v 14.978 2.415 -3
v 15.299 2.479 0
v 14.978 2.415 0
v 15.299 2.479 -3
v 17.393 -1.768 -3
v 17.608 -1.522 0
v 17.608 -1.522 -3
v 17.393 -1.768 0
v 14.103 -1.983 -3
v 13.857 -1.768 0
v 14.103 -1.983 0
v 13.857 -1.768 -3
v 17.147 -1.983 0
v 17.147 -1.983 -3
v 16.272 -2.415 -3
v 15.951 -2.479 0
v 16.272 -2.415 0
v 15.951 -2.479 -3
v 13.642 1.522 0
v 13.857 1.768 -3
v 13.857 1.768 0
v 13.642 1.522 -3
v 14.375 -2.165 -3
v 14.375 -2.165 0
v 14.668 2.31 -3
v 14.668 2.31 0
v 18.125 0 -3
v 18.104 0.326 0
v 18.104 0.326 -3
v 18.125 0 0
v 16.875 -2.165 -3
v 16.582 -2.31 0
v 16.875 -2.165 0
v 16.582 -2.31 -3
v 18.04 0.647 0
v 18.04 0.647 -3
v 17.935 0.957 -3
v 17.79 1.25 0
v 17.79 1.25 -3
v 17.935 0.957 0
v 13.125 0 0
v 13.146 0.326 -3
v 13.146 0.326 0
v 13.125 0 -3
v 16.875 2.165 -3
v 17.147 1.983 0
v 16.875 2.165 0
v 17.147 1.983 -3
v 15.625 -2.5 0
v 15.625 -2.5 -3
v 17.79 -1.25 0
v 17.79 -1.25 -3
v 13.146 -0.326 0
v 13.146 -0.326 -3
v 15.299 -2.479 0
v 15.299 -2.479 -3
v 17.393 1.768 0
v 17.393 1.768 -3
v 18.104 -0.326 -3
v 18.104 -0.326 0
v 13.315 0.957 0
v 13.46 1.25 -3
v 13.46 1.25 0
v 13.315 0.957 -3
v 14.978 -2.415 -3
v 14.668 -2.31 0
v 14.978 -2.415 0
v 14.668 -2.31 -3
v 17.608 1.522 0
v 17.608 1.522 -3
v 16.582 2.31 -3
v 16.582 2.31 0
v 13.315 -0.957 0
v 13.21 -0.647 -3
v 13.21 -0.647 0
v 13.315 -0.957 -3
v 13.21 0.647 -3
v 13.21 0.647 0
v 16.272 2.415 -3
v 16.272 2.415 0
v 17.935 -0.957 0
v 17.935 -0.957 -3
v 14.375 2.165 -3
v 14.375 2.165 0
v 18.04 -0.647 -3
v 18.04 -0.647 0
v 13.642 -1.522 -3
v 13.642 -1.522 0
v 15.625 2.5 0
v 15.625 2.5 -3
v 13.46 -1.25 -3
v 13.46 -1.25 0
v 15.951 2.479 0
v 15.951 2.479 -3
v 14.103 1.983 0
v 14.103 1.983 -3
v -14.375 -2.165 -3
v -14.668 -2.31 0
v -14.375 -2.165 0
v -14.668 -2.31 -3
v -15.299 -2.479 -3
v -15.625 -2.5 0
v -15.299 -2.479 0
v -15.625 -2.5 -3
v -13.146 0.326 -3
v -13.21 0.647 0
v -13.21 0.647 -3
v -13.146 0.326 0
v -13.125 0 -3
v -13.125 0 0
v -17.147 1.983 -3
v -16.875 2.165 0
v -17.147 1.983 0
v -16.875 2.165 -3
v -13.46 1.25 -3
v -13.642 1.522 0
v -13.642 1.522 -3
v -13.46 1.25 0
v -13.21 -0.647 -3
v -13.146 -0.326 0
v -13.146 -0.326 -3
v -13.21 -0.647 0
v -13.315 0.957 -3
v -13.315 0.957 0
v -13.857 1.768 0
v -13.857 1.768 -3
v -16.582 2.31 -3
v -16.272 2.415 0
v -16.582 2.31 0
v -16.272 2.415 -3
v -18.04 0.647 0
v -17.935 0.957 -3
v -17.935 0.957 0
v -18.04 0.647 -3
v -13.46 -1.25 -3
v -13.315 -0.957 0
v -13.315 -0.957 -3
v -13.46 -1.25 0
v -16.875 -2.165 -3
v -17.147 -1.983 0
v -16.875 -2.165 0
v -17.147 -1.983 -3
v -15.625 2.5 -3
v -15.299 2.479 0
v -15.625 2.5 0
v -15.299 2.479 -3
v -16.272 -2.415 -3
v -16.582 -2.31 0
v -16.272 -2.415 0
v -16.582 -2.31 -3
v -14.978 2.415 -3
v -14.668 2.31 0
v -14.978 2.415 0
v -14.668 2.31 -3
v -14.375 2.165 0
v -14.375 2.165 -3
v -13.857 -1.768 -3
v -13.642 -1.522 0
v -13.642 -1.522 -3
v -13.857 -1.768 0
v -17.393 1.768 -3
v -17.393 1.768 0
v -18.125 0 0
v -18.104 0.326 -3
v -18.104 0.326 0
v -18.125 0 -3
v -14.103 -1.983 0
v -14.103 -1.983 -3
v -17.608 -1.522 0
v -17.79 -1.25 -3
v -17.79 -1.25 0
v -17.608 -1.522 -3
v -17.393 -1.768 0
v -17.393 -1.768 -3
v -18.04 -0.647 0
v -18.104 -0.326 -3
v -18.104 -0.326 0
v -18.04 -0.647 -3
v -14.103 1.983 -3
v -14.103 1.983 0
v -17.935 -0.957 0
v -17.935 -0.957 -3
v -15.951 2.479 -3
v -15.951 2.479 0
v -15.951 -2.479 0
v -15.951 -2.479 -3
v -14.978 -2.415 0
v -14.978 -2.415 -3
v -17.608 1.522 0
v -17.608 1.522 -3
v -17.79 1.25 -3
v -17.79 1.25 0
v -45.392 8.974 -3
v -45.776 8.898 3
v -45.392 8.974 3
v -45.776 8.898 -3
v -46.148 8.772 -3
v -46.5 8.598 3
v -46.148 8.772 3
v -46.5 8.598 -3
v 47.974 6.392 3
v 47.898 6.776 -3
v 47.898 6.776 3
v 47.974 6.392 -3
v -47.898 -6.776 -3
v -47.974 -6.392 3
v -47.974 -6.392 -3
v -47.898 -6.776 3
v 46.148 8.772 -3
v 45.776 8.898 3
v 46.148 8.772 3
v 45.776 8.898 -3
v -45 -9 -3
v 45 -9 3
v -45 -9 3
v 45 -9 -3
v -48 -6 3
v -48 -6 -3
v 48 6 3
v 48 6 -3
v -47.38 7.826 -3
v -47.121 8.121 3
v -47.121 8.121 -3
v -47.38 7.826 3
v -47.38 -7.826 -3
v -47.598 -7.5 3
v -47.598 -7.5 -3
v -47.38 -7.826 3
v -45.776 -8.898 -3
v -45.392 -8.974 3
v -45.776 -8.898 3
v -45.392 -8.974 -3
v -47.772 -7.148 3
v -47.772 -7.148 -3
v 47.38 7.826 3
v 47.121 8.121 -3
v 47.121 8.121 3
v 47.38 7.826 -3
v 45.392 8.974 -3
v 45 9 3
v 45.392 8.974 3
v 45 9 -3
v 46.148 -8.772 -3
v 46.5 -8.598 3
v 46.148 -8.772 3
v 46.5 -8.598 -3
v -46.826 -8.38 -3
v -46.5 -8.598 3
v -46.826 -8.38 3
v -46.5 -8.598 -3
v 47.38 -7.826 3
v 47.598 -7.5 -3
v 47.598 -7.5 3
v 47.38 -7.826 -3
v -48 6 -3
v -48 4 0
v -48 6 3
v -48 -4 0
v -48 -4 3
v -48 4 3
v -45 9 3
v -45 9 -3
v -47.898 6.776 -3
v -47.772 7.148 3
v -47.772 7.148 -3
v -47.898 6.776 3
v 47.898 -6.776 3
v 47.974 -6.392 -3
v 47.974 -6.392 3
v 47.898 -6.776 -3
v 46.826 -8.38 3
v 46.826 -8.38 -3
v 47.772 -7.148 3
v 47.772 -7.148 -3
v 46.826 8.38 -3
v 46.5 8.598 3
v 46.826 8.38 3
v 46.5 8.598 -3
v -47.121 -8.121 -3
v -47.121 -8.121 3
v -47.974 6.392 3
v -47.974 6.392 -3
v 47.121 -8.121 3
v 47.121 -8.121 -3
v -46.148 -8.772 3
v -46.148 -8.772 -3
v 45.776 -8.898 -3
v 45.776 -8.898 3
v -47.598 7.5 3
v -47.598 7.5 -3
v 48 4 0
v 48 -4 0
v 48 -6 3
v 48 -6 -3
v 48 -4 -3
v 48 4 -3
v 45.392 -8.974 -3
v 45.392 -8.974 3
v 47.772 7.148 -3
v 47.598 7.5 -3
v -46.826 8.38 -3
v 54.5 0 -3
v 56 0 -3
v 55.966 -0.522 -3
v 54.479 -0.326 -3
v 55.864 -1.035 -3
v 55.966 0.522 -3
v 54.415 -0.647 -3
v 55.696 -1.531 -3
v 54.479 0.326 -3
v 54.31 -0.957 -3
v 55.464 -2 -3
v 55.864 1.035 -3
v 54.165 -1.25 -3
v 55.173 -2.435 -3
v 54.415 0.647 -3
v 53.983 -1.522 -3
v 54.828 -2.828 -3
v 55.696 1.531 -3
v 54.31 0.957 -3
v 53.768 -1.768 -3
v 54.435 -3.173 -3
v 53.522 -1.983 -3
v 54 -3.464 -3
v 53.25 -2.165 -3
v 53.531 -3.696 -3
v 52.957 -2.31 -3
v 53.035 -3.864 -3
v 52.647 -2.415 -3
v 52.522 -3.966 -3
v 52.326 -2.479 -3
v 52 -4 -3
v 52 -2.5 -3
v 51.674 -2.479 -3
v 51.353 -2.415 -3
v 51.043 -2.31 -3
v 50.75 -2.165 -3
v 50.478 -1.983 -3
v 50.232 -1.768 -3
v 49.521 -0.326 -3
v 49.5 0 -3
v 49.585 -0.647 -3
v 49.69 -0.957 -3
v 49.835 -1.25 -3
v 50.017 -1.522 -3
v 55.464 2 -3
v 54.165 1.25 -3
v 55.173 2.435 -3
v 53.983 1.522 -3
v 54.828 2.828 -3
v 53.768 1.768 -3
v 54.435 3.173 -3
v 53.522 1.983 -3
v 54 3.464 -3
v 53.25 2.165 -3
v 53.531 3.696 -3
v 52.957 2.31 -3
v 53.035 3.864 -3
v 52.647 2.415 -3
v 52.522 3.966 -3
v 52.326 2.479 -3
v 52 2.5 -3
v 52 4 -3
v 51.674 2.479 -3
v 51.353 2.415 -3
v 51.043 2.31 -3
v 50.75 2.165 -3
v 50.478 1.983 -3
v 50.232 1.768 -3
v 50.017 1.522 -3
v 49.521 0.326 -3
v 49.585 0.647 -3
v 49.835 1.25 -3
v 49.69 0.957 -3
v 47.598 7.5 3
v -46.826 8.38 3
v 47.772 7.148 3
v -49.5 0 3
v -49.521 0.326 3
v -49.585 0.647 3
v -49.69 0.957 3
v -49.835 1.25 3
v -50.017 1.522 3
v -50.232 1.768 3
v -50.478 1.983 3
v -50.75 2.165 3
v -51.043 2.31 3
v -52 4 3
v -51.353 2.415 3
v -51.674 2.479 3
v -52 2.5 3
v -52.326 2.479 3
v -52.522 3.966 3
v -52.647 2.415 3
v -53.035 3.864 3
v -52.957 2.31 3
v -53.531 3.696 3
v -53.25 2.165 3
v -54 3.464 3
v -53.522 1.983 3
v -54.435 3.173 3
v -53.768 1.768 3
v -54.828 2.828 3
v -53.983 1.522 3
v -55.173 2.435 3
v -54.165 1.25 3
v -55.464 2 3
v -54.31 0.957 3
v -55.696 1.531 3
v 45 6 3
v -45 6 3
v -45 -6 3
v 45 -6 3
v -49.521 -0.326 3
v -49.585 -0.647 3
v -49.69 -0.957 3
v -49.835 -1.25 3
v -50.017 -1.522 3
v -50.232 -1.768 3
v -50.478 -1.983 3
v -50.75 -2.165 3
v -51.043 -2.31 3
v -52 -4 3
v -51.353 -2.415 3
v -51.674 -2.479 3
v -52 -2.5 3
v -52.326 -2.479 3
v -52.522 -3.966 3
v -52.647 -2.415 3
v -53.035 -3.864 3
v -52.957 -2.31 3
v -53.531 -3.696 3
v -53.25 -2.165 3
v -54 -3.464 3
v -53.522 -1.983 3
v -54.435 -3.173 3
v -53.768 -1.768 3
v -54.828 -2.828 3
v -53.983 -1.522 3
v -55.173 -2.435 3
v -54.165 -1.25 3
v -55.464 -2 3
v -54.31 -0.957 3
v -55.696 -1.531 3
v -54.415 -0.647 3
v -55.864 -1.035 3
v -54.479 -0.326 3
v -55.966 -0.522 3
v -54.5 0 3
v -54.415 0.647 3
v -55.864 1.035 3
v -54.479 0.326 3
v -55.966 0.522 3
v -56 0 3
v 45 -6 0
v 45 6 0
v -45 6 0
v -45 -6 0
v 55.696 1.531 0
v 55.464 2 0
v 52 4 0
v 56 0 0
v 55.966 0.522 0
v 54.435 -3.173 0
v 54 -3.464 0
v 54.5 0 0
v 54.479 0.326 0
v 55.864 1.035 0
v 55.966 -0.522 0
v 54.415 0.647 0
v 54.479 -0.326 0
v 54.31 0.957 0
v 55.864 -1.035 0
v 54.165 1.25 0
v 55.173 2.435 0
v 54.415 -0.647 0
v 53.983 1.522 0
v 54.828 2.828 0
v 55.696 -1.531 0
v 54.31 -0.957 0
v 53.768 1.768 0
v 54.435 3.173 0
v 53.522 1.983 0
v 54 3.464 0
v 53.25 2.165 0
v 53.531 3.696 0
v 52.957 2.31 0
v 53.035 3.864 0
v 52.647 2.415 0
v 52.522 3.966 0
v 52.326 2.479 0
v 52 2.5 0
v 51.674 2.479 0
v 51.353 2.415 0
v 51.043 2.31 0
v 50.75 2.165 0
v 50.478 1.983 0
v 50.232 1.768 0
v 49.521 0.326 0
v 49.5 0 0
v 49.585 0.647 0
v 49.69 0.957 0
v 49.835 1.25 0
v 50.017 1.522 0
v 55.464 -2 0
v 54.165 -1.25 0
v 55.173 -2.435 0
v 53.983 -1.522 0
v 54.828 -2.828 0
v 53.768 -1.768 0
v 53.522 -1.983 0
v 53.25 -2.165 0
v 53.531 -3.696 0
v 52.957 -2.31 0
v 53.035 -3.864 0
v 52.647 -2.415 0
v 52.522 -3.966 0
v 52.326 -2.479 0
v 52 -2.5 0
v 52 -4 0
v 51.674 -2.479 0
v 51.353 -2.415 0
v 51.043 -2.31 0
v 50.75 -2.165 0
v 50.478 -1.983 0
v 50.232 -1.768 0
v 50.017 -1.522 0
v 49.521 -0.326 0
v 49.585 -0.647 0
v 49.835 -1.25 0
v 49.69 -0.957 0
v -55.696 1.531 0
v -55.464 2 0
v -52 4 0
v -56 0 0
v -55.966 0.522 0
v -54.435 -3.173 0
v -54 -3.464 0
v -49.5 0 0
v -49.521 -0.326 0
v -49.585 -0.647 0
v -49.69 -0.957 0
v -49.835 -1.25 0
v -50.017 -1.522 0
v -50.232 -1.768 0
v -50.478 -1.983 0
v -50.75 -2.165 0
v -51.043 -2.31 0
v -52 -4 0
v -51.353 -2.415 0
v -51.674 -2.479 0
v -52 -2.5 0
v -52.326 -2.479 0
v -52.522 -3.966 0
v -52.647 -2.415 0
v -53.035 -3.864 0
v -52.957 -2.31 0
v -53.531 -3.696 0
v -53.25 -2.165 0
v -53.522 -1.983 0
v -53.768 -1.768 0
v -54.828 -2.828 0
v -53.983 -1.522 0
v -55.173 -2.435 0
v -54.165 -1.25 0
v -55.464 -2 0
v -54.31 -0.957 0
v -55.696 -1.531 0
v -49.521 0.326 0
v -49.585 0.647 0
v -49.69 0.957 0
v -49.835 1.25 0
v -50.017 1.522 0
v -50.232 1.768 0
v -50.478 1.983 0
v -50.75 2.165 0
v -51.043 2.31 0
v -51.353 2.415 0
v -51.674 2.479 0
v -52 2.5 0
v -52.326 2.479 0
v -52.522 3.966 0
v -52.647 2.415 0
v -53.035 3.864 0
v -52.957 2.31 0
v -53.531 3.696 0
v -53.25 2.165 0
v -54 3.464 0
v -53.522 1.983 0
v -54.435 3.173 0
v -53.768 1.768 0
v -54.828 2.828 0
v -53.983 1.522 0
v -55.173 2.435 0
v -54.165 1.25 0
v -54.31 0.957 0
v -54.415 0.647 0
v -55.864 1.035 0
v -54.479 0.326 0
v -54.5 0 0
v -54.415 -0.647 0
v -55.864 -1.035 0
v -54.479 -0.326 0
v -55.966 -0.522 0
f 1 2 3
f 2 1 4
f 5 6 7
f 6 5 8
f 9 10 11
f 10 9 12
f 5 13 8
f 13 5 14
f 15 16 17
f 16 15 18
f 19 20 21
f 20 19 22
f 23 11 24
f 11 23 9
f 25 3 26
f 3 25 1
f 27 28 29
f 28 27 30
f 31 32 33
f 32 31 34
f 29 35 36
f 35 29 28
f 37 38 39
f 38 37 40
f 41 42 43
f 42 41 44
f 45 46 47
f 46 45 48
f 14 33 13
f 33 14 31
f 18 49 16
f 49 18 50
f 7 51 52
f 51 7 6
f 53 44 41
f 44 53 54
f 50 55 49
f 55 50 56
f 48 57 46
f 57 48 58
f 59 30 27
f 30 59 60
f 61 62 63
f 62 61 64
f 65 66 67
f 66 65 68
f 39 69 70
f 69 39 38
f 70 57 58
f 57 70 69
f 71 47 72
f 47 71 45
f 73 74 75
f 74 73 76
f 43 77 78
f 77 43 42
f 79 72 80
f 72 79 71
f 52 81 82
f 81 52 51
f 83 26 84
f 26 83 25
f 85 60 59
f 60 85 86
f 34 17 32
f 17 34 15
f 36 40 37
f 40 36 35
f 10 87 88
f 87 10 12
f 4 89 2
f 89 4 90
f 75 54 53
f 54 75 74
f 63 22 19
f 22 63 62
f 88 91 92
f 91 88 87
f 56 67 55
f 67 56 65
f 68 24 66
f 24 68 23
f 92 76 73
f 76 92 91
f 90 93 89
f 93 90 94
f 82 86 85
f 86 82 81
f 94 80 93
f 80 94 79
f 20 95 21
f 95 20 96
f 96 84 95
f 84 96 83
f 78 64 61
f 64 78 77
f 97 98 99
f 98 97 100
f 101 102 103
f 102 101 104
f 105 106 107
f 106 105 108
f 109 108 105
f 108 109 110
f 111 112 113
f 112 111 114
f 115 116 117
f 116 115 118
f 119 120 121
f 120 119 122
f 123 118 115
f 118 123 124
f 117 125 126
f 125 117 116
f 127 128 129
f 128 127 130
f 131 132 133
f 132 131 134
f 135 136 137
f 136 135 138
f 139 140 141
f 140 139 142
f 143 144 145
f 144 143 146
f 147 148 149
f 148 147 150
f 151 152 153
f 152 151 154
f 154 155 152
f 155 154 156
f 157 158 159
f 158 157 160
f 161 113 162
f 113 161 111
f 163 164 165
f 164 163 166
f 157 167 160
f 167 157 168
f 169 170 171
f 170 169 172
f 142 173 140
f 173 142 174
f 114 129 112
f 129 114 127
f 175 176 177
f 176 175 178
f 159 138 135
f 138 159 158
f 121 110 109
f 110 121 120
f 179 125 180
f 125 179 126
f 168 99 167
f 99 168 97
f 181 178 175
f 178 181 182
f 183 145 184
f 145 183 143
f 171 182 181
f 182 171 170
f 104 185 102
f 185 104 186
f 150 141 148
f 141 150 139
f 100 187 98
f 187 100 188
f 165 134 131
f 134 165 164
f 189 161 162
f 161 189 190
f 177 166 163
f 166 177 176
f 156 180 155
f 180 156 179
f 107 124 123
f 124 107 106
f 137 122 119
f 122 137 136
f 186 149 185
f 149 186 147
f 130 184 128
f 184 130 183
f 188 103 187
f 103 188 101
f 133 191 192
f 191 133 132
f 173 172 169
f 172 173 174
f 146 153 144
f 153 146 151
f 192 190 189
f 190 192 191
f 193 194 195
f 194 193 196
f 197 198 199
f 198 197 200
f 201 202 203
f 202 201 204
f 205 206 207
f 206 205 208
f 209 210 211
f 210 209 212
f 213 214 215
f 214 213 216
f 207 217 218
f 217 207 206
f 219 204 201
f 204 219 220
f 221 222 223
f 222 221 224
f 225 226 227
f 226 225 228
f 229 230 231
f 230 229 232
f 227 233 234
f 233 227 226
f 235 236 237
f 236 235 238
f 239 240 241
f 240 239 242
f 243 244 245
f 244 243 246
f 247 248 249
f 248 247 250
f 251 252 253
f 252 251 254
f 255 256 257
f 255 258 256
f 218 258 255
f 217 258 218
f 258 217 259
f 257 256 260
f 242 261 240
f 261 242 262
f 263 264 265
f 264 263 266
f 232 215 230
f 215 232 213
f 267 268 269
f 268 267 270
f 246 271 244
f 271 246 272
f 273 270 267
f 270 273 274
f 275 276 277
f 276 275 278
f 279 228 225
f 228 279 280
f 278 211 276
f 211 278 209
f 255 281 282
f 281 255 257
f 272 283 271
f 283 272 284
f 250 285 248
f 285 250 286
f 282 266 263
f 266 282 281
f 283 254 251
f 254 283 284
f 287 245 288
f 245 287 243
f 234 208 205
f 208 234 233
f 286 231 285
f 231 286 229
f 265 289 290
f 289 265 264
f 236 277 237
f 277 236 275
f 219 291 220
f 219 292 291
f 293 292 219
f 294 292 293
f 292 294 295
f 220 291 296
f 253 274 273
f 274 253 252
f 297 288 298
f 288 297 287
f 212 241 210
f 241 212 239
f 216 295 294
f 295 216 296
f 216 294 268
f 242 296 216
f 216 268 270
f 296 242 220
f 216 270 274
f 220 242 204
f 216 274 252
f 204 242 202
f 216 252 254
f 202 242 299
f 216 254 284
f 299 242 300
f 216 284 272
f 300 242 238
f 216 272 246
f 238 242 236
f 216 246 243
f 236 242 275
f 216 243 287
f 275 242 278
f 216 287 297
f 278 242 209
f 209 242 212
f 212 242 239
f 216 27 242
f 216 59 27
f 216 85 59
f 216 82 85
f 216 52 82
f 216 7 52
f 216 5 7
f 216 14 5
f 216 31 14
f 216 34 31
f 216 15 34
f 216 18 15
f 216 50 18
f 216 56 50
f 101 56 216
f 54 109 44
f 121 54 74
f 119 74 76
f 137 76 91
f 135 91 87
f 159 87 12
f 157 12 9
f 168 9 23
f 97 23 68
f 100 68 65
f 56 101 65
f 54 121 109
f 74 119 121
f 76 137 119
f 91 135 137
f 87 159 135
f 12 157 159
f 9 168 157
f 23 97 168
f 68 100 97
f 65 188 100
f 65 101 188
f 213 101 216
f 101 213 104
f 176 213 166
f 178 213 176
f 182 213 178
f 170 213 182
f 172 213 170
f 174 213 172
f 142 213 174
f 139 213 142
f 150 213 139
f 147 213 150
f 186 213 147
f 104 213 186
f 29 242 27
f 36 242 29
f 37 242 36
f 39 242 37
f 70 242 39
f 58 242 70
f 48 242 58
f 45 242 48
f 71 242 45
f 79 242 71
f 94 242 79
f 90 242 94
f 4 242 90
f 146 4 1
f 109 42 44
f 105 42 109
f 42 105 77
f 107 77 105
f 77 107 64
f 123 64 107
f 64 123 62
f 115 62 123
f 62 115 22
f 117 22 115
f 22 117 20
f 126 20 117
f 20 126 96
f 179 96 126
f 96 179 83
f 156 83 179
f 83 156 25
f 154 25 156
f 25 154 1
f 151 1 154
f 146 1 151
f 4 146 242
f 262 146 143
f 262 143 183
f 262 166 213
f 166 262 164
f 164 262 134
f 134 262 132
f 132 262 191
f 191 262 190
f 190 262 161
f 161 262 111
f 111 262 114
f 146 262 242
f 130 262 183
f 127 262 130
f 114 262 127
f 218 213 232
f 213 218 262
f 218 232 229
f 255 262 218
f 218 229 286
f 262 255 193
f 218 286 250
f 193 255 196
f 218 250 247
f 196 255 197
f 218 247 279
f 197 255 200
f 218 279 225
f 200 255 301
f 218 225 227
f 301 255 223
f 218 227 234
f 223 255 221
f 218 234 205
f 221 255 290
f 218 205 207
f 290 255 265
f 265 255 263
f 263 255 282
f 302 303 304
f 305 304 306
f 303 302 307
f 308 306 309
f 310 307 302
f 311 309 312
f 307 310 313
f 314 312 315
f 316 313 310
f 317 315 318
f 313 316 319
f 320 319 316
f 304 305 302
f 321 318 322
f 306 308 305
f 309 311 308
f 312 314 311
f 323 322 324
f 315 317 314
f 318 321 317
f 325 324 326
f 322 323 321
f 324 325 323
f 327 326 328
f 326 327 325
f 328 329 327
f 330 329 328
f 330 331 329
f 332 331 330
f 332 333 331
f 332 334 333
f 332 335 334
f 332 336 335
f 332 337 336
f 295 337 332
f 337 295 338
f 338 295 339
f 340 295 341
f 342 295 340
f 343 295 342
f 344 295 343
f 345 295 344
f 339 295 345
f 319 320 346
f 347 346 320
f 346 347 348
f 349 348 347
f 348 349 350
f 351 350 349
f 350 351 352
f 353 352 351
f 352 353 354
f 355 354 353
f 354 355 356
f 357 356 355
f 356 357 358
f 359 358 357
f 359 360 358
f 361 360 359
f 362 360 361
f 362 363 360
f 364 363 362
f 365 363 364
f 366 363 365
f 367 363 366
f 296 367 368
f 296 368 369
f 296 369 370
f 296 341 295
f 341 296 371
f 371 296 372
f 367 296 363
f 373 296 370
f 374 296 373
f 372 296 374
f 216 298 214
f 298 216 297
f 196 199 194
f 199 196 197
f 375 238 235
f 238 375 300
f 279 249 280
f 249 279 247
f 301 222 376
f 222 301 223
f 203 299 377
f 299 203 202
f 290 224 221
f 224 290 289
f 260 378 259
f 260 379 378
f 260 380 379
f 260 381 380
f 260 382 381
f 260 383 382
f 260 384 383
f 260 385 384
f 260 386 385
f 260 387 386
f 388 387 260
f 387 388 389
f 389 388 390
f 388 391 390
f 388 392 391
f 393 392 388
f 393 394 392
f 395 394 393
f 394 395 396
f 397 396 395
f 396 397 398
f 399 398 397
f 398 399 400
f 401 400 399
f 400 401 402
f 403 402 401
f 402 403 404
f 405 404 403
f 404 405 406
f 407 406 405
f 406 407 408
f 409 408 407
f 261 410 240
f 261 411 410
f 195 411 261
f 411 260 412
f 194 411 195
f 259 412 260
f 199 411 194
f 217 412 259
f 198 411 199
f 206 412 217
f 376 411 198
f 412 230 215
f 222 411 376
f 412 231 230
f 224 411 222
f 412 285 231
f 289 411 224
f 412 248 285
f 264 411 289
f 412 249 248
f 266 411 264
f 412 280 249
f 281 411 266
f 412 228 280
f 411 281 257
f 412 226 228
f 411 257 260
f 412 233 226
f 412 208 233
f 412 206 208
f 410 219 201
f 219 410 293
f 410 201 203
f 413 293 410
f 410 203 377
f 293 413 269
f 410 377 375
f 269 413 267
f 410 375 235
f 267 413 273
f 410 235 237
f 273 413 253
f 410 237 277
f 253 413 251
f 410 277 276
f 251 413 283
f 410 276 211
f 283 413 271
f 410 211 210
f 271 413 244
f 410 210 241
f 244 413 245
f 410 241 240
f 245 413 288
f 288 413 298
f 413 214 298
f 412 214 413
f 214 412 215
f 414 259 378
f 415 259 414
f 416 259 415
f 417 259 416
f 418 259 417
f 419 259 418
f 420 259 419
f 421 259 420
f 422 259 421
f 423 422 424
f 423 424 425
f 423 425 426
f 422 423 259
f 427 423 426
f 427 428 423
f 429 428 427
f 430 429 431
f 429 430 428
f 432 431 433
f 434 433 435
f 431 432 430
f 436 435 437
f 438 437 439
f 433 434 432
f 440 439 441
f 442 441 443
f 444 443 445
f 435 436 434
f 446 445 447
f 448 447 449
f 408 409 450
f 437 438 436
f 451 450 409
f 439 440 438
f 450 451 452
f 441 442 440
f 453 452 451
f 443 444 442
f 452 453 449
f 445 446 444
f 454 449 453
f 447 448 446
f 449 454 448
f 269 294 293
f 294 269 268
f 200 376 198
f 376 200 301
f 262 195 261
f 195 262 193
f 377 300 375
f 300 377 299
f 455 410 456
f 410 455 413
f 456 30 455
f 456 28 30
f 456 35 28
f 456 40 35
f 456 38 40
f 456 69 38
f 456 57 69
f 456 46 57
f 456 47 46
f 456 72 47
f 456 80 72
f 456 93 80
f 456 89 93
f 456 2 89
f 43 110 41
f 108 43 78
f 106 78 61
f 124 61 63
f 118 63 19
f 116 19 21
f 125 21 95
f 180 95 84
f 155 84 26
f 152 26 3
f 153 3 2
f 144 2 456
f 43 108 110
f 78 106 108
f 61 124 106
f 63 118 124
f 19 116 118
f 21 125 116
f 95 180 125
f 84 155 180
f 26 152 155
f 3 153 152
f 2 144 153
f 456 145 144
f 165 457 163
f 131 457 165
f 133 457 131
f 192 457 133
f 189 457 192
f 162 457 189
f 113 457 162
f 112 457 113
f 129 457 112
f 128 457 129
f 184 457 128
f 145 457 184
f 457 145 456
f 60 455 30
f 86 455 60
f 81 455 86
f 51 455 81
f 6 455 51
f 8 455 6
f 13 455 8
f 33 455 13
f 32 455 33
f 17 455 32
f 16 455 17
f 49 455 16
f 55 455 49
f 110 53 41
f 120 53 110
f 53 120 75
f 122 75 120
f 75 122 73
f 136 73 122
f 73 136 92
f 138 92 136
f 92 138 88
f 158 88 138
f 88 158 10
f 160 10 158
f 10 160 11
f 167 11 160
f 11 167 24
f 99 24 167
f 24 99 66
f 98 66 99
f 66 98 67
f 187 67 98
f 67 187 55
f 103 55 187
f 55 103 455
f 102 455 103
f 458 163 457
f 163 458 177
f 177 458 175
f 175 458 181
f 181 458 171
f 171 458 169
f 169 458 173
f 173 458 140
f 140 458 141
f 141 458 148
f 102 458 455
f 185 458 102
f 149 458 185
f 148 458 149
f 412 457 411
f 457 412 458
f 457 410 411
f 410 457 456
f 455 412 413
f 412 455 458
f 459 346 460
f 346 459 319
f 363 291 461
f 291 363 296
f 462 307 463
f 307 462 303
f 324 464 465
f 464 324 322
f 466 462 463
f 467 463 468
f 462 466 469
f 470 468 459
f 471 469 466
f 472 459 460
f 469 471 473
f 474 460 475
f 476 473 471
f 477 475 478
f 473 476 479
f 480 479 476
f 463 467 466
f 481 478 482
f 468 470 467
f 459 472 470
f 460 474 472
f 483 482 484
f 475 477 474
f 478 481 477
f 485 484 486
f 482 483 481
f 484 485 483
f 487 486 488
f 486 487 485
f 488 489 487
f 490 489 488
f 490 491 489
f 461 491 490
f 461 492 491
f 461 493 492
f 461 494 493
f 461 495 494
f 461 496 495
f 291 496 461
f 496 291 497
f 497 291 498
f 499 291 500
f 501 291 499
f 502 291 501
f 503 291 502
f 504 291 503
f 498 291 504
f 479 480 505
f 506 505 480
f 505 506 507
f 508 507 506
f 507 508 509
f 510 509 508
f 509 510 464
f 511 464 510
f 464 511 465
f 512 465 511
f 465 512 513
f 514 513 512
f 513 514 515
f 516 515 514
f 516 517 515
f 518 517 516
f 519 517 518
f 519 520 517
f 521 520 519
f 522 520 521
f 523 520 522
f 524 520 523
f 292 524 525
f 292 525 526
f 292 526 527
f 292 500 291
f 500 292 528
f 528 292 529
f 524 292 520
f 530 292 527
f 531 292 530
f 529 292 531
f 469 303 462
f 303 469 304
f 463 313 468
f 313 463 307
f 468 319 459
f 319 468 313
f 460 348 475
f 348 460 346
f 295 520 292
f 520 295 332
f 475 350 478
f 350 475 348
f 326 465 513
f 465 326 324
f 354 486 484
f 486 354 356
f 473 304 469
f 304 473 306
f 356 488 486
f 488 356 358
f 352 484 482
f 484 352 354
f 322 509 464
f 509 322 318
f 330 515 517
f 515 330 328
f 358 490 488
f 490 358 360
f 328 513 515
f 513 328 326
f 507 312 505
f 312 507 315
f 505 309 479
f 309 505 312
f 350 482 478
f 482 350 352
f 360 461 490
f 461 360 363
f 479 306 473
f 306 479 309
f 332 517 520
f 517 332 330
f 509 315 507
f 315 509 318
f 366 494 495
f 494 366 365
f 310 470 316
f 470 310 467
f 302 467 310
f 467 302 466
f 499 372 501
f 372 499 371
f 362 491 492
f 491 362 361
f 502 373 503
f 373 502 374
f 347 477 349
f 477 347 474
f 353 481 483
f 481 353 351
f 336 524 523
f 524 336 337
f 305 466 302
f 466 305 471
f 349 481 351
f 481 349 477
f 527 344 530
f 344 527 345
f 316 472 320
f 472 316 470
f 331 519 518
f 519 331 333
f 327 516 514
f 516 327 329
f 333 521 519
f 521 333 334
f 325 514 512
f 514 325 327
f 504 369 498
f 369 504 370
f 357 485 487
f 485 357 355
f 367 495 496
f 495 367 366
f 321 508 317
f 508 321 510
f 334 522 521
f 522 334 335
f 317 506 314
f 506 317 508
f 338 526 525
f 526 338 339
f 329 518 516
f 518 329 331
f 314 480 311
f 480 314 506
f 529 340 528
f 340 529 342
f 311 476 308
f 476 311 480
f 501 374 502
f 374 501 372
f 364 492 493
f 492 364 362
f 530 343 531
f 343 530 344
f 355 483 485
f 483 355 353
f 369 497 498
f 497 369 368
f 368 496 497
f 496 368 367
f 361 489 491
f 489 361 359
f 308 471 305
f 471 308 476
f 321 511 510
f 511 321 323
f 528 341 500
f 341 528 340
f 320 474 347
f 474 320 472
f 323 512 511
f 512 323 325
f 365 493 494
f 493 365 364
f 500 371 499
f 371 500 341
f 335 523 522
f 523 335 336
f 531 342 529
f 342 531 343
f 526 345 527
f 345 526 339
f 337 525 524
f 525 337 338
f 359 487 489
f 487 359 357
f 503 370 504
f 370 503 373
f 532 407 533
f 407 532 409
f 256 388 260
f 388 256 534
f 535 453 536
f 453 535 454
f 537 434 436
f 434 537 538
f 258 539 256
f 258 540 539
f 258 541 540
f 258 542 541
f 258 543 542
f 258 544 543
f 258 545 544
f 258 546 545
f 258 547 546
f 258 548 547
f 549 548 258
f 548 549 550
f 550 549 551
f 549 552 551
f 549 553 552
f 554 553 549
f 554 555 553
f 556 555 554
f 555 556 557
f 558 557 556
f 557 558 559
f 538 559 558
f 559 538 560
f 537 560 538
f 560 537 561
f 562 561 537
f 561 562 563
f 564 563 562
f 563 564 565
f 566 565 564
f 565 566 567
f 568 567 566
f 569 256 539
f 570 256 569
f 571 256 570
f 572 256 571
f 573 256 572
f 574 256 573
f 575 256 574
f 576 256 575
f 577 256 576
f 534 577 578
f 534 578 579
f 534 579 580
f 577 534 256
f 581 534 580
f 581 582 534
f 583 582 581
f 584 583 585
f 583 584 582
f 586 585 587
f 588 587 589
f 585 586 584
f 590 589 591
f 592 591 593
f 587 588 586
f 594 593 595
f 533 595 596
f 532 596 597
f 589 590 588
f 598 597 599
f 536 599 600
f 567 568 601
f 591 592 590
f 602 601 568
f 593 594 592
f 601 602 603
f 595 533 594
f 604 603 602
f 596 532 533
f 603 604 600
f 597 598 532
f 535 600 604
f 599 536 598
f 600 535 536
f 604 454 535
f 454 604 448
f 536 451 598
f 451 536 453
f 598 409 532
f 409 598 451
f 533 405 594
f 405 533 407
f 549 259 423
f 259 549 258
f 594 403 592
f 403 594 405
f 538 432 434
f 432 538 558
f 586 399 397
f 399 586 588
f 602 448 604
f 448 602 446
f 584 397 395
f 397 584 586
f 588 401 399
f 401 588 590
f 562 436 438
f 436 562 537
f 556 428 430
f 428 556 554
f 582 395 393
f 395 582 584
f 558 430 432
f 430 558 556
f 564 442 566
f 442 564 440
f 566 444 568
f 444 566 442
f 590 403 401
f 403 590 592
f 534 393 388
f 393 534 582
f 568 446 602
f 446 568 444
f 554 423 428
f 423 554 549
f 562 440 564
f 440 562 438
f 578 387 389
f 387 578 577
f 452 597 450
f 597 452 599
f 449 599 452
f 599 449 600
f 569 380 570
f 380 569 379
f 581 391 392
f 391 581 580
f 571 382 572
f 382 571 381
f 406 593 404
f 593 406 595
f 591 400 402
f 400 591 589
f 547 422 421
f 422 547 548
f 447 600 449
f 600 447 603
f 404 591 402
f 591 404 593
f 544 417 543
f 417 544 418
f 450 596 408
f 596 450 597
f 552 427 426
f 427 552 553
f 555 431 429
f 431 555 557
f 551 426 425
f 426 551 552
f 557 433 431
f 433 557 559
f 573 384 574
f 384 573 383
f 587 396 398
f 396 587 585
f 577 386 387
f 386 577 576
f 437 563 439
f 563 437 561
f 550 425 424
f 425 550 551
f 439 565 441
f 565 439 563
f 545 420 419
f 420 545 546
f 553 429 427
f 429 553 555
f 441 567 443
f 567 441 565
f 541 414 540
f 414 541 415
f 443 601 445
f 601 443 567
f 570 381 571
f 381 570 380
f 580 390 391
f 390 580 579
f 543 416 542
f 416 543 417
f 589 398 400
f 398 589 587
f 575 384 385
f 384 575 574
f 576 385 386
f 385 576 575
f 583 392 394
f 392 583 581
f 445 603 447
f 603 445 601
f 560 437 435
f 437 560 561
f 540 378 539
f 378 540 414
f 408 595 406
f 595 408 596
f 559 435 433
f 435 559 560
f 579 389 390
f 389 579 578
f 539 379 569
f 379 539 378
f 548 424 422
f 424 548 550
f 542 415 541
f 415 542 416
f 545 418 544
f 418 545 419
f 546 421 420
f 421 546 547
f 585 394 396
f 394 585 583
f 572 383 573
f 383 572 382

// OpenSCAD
$fn=48;
ball_bearing_d = 16+.25;
height_ball = 0.5;
ball_bearing_wall = 2;

screw_thread_d= 5 ;
screw_thread_wall = 3;
screw_head = 8;
slop=0.2;
layer_height = 0.4;

framing_wall = 3;
wood_width=63;
wood_height=38;

screw_near_edge=10;


angle_of_support = 45;
angle_of_top = 45+15;

screw_outer=screw_thread_d+screw_thread_wall*2;
screw_outer_translate=(ball_bearing_d+screw_outer)/2+ball_bearing_wall;


// http://www.ambrsoft.com/TrigoCalc/Sphere/Cap/SphereCap.htm
// h=R(1-cosTheta)
// r=RsinTheta
height_base=(ball_bearing_d/2)*(1-cos(angle_of_support));
radius_base=(ball_bearing_d/2)*(sin(angle_of_support));



module ball_bearing() {
    translate([0,0, height_ball + ball_bearing_d/2])
        color(alpha = 0.95, c = "Blue") 
            sphere(d = ball_bearing_d);
}

module tube(d1, d2, h)
{
    difference() {
        cylinder(d=d1, h=h);
        cylinder(d=d2, h=h*4, center=true);
    }
}

module screw_hole(connector=0)
{
    if(connector==1)
    {
        cylinder(d=screw_thread_d+
                    screw_thread_wall/2+slop*2,
                 h=(height_base+height_ball)*4,
                 center=true
                 );
    }
    else
    {
        cylinder(d=screw_thread_d,
                 h=(height_base+height_ball)*4,
                 center=true
                 );
    }    
}

module screw_hole_pair(connector=0)
{
    translate([screw_outer_translate,
                0,
                0]) 
        screw_hole(connector=connector);
    translate([-screw_outer_translate,
                0,
                0]) 
        screw_hole(connector=connector);
    if(connector<3)
    {
        cylinder(d=ball_bearing_d ,
                    h=(height_base+height_ball)*4,
                    center=true
                    );
    }
}




module screw_mount(connector=0)
{
    
    difference()
    {
        union()
        {
            hull()
            {
                translate([screw_outer_translate,
                            0,
                            0]) 
                    cylinder(d=screw_outer,
                            h=height_base+height_ball
                            );
                translate([-screw_outer_translate,
                            0,
                            0]) 
                    cylinder(d=screw_outer,
                            h=height_base+height_ball
                            );
            }
            if(connector==2)
            {
               translate([-screw_outer_translate,
                      0,
                      0]) 
                cylinder(
                    d=screw_thread_d+screw_thread_wall/2,
                    h=height_base*1.5+height_ball
                    );
               translate([screw_outer_translate,
                      0,
                      0]) 
                cylinder(
                    d=screw_thread_d+screw_thread_wall/2,
                    h=height_base*1.5+height_ball
                    );
            }
        }
        screw_hole_pair(connector=connector);
    }
}

module bearing_shell()
{
    screw_outer = ball_bearing_d + ball_bearing_wall*2;
    translate([0,0, height_ball + ball_bearing_d/2])difference()
    {
        sphere(d = screw_outer);    
        sphere(d = ball_bearing_d);
        translate([0,0,-screw_outer/2]) cube(screw_outer, center=true);
        translate([0,0,screw_outer-ball_bearing_wall-height_base*1.5]) cube(screw_outer, center=true);        
    }
    translate([0,0, height_ball + height_base]) difference()
    {
        tube(screw_outer, ball_bearing_d, ball_bearing_d/2-height_base);
    }
    translate([0,0,height_base+height_ball]) screw_mount(connector=1);

}


module base_holder(){
    tube(ball_bearing_d+ball_bearing_wall*2, radius_base*2, height_base+height_ball);
    screw_mount(connector=2);
}

// Used by python scripts



module support_base(height_c=100, length_c=50, connector=0, text="1A")
{
    top_support = height_c-height_base;
    screw_mount_h = height_base+height_ball;
    cylinder_d = ball_bearing_d+ball_bearing_wall*2;
    
    
    translate([0,0,top_support]) base_holder();

    // Min screw length m5=30 allow 10 to manimulate
    if(height_c<40)
    {
        scale_z = top_support/(screw_mount_h);
        scale([1,1,scale_z]) screw_mount();
    }
    else
    {
        scale([1,1,2]) screw_mount();
        // Need support for high screw_mount
        translate([0,0,top_support-layer_height*2]) 
        {
            difference()
            {
                rotate([0,45,0])
                    cube([(screw_outer_translate*2+screw_outer*1)*sin(45), 
                        screw_outer,
                        (screw_outer_translate*2+screw_outer*1)*sin(45)], 
                        center=true);
                rotate([0,45,0])
                    cube([(screw_outer_translate*2+screw_outer*1), 
                        screw_head,
                        (screw_outer_translate*2+screw_outer*1)], 
                        center=true);
               translate([0,0,(screw_outer_translate*2+screw_outer*1)/2]) cube(screw_outer_translate*2+screw_outer*1, center=true);
            
            }
            // Print a square hole below the circle to ease printing
            translate([0,0,layer_height])  difference() 
            {                
                cube([screw_outer_translate*2+screw_outer*1,
                    screw_outer, 
                    layer_height*2],
                    center=true
                );
                translate([screw_outer_translate,0,-layer_height/2])
                    cube([screw_thread_d,
                        screw_head, 
                        layer_height],
                        center=true
                    );
                translate([screw_outer_translate,0,+layer_height/2])
                    cube([screw_thread_d,
                        screw_thread_d, 
                        layer_height],
                        center=true
                    );
                translate([-screw_outer_translate,0,-layer_height/2])
                    cube([screw_thread_d,
                        screw_head, 
                        layer_height],
                        center=true
                    );
                translate([-screw_outer_translate,0,+layer_height/2])
                    cube([screw_thread_d,
                        screw_thread_d, 
                        layer_height],
                        center=true
                    );

            }
        }
    }

    // main support Cylinder
    cylinder(d=cylinder_d,
            h=top_support);


    // spacer between cylinders
    difference()
    {
        translate([0,0,framing_wall/2]) cube([length_c,framing_wall,framing_wall], center=true);
        screw_hole_pair();
    }

    // Part to macth edge of support wood (wood_width) with screw_hole
    difference() {
         translate([(screw_outer)/2,wood_width/2-cylinder_d/2,framing_wall/2])
            cube([screw_outer+framing_wall,wood_width,framing_wall], center=true);
         cylinder(r=radius_base, h=framing_wall*4, center=true);
        translate([0, -cylinder_d/2, 0])  cube([(screw_outer+framing_wall)*2, cylinder_d/2,framing_wall*4], center=true);
        translate([(screw_outer+framing_wall)/2, wood_width-cylinder_d/2-screw_near_edge, 0]) screw_hole();
    }
    // Diagnal rib
    difference() {
        translate([0,-cylinder_d/2,framing_wall]) 
        rotate([45,0,0]) cube([framing_wall, wood_width*cos(45)*2, wood_width*cos(45)*2], center=true);
        translate([0,-wood_width*1+cylinder_d/3, 0]) cube([framing_wall*2, wood_width*2, wood_width*4], center=true);
        translate([0,0, -wood_width]) cube([framing_wall*2, wood_width*4, wood_width*2], center=true);
        if(height_c<wood_width)
        {
        translate([0,wood_width+cylinder_d/2,wood_width-(wood_width-height_c)-framing_wall]) 
        rotate([45,0,0]) cube([framing_wall*2, wood_width*cos(45)*2, wood_width*cos(45)*4], center=true);
        }
            
    }
    // text 
    translate([framing_wall/2,wood_width/2,0]) linear_extrude(framing_wall+layer_height) text(text, size=screw_outer/2);


    // to align to side of support 1 of 2
  *  translate([-length_c/2+framing_wall,
                -cylinder_d/4,
                framing_wall/4]) 
            cube([framing_wall,
                  cylinder_d/2,
                  framing_wall/2], 
                  center=true);    
    if(connector==1){
    // to align to side of support 2 of 2
   *     translate([+length_c/2-framing_wall,
                -cylinder_d/4,
                framing_wall/4]) 
            cube([framing_wall,
                  cylinder_d/2,
                  framing_wall/2], 
                  center=true);

        // connector between cylinders
         translate([length_c/2,0,framing_wall/2]) 
        {
            difference()
            {
                cube([framing_wall,framing_wall*3,framing_wall], center=true);
                translate([framing_wall/2,0,0]) cube([framing_wall,framing_wall+slop,framing_wall*4], center=true);
            }
        }
    }
}

module belt_connect_hidge(slat_w=90, slat_t=12)
{
    os=screw_thread_d+screw_thread_wall;
    translate([slat_w/2+os/2+framing_wall,0,-framing_wall/2]) difference()
    {
        hull()
        {
            cylinder(d=os, h=framing_wall, center=true);
            translate([-os/4,0,0]) cube([os/2,os, framing_wall],center=true);
        }
        cylinder(d=screw_thread_d,h=framing_wall*2, center=true);
    }
}

module rounded_cube(x,y,z,r)
{
    hull()
    {
        translate([x/2-r, y/2-r, 0]) cylinder(r=r, h=z, center=true);
        translate([x/2-r, -y/2+r, 0]) cylinder(r=r, h=z, center=true);
        translate([-x/2+r, y/2-r, 0]) cylinder(r=r, h=z, center=true);
        translate([-x/2+r, -y/2+r, 0]) cylinder(r=r, h=z, center=true);
    }
}

module belt_connect(slat_w=90, slat_t=12)
{
    difference()
    {
        * cube([slat_w+framing_wall*2, slat_t+framing_wall*2, framing_wall*2], center=true);
        rounded_cube(slat_w+framing_wall*2,
                     slat_t+framing_wall*2,
                     framing_wall*2,
                     framing_wall);
        translate([0,0,framing_wall*2]) cube([slat_w, slat_t, framing_wall*4], center=true);
        screw_hole_pair(connector=3);
    }
    belt_connect_hidge();
    rotate([0,180,0]) belt_connect_hidge();
}


module turn_nighty_bearing(diameter_turn=320, notch_h=100, notch_overlap=10)
{
    union() translate([(-diameter_turn/4)*sin(45)+notch_overlap*2/sin(45),0,0])
    {
        difference()
        {
            union()
            {
                for (a =[0:15:90-15])
                {
                    translate([0,0,-diameter_turn/2*sin(45)]) rotate([0,a+7.5-45,0]) turn_nighty_bearing_part();
                }
            }
            translate([0,0,-diameter_turn/2])  cube([diameter_turn,screw_outer*4,diameter_turn], center=true);
            //Notch
            translate([0,0,-diameter_turn/2*sin(45)])  
             rotate([0,45,0]) 
              translate([-diameter_turn/2+notch_h+notch_overlap,0,notch_h+notch_overlap])  
                    cube([notch_overlap*2,notch_overlap*4,notch_overlap*2], center=true);
        }
        
         translate([0,0,-diameter_turn/2*sin(45)])  
             rotate([0,45,0]) 
              translate([-diameter_turn/2+notch_h-framing_wall/2,wood_width/2-(ball_bearing_d+ball_bearing_wall*2)/2,notch_h+notch_overlap]) 
                {
                    difference()
                    {
                        cube([framing_wall,wood_width,notch_overlap*2], center=true);
                       translate([0,(ball_bearing_d+ball_bearing_wall*2)/2,0]) rotate([90,0,0]) rotate([0,90,0]) screw_hole_pair(connector=3);
                    }
                    translate([-wood_width/2,0,(framing_wall-notch_overlap*2)/2]) 
                    difference()
                    {
                        cube([wood_width,wood_width,framing_wall], center=true);
                        rotate([0,0,45]) translate([wood_width,wood_width,]) cube([wood_width*4,wood_width*2,framing_wall*4], center=true);
                    }
                }
            }
}


module turn_nighty_bearing_part(diameter_turn=320)
{
    translate([0,0,diameter_turn/2]) base_holder();
    difference()
    {
        translate([0,0,diameter_turn/4]) 
            cube([diameter_turn/4,
                  (ball_bearing_d+ball_bearing_wall*2),
                  diameter_turn/2], center=true);
        
        rotate([0,15/2,0])
            translate([diameter_turn/8,0,diameter_turn/4]) 
            cube([diameter_turn/4,
                  (ball_bearing_d+ball_bearing_wall*2)*2,
                  diameter_turn], center=true);
        rotate([0,-15/2,0])
            translate([-diameter_turn/8,0,diameter_turn/4]) 
            cube([diameter_turn/4,
                  (ball_bearing_d+ball_bearing_wall*2)*2,
                  diameter_turn], center=true);
    }
}



*ball_bearing();
*bearing_shell();
*support_base();
belt_connect();
*rounded_cube(90,16,12,5);
*rotate([0,45,0]) turn_nighty_bearing();
*turn_nighty_bearing();
